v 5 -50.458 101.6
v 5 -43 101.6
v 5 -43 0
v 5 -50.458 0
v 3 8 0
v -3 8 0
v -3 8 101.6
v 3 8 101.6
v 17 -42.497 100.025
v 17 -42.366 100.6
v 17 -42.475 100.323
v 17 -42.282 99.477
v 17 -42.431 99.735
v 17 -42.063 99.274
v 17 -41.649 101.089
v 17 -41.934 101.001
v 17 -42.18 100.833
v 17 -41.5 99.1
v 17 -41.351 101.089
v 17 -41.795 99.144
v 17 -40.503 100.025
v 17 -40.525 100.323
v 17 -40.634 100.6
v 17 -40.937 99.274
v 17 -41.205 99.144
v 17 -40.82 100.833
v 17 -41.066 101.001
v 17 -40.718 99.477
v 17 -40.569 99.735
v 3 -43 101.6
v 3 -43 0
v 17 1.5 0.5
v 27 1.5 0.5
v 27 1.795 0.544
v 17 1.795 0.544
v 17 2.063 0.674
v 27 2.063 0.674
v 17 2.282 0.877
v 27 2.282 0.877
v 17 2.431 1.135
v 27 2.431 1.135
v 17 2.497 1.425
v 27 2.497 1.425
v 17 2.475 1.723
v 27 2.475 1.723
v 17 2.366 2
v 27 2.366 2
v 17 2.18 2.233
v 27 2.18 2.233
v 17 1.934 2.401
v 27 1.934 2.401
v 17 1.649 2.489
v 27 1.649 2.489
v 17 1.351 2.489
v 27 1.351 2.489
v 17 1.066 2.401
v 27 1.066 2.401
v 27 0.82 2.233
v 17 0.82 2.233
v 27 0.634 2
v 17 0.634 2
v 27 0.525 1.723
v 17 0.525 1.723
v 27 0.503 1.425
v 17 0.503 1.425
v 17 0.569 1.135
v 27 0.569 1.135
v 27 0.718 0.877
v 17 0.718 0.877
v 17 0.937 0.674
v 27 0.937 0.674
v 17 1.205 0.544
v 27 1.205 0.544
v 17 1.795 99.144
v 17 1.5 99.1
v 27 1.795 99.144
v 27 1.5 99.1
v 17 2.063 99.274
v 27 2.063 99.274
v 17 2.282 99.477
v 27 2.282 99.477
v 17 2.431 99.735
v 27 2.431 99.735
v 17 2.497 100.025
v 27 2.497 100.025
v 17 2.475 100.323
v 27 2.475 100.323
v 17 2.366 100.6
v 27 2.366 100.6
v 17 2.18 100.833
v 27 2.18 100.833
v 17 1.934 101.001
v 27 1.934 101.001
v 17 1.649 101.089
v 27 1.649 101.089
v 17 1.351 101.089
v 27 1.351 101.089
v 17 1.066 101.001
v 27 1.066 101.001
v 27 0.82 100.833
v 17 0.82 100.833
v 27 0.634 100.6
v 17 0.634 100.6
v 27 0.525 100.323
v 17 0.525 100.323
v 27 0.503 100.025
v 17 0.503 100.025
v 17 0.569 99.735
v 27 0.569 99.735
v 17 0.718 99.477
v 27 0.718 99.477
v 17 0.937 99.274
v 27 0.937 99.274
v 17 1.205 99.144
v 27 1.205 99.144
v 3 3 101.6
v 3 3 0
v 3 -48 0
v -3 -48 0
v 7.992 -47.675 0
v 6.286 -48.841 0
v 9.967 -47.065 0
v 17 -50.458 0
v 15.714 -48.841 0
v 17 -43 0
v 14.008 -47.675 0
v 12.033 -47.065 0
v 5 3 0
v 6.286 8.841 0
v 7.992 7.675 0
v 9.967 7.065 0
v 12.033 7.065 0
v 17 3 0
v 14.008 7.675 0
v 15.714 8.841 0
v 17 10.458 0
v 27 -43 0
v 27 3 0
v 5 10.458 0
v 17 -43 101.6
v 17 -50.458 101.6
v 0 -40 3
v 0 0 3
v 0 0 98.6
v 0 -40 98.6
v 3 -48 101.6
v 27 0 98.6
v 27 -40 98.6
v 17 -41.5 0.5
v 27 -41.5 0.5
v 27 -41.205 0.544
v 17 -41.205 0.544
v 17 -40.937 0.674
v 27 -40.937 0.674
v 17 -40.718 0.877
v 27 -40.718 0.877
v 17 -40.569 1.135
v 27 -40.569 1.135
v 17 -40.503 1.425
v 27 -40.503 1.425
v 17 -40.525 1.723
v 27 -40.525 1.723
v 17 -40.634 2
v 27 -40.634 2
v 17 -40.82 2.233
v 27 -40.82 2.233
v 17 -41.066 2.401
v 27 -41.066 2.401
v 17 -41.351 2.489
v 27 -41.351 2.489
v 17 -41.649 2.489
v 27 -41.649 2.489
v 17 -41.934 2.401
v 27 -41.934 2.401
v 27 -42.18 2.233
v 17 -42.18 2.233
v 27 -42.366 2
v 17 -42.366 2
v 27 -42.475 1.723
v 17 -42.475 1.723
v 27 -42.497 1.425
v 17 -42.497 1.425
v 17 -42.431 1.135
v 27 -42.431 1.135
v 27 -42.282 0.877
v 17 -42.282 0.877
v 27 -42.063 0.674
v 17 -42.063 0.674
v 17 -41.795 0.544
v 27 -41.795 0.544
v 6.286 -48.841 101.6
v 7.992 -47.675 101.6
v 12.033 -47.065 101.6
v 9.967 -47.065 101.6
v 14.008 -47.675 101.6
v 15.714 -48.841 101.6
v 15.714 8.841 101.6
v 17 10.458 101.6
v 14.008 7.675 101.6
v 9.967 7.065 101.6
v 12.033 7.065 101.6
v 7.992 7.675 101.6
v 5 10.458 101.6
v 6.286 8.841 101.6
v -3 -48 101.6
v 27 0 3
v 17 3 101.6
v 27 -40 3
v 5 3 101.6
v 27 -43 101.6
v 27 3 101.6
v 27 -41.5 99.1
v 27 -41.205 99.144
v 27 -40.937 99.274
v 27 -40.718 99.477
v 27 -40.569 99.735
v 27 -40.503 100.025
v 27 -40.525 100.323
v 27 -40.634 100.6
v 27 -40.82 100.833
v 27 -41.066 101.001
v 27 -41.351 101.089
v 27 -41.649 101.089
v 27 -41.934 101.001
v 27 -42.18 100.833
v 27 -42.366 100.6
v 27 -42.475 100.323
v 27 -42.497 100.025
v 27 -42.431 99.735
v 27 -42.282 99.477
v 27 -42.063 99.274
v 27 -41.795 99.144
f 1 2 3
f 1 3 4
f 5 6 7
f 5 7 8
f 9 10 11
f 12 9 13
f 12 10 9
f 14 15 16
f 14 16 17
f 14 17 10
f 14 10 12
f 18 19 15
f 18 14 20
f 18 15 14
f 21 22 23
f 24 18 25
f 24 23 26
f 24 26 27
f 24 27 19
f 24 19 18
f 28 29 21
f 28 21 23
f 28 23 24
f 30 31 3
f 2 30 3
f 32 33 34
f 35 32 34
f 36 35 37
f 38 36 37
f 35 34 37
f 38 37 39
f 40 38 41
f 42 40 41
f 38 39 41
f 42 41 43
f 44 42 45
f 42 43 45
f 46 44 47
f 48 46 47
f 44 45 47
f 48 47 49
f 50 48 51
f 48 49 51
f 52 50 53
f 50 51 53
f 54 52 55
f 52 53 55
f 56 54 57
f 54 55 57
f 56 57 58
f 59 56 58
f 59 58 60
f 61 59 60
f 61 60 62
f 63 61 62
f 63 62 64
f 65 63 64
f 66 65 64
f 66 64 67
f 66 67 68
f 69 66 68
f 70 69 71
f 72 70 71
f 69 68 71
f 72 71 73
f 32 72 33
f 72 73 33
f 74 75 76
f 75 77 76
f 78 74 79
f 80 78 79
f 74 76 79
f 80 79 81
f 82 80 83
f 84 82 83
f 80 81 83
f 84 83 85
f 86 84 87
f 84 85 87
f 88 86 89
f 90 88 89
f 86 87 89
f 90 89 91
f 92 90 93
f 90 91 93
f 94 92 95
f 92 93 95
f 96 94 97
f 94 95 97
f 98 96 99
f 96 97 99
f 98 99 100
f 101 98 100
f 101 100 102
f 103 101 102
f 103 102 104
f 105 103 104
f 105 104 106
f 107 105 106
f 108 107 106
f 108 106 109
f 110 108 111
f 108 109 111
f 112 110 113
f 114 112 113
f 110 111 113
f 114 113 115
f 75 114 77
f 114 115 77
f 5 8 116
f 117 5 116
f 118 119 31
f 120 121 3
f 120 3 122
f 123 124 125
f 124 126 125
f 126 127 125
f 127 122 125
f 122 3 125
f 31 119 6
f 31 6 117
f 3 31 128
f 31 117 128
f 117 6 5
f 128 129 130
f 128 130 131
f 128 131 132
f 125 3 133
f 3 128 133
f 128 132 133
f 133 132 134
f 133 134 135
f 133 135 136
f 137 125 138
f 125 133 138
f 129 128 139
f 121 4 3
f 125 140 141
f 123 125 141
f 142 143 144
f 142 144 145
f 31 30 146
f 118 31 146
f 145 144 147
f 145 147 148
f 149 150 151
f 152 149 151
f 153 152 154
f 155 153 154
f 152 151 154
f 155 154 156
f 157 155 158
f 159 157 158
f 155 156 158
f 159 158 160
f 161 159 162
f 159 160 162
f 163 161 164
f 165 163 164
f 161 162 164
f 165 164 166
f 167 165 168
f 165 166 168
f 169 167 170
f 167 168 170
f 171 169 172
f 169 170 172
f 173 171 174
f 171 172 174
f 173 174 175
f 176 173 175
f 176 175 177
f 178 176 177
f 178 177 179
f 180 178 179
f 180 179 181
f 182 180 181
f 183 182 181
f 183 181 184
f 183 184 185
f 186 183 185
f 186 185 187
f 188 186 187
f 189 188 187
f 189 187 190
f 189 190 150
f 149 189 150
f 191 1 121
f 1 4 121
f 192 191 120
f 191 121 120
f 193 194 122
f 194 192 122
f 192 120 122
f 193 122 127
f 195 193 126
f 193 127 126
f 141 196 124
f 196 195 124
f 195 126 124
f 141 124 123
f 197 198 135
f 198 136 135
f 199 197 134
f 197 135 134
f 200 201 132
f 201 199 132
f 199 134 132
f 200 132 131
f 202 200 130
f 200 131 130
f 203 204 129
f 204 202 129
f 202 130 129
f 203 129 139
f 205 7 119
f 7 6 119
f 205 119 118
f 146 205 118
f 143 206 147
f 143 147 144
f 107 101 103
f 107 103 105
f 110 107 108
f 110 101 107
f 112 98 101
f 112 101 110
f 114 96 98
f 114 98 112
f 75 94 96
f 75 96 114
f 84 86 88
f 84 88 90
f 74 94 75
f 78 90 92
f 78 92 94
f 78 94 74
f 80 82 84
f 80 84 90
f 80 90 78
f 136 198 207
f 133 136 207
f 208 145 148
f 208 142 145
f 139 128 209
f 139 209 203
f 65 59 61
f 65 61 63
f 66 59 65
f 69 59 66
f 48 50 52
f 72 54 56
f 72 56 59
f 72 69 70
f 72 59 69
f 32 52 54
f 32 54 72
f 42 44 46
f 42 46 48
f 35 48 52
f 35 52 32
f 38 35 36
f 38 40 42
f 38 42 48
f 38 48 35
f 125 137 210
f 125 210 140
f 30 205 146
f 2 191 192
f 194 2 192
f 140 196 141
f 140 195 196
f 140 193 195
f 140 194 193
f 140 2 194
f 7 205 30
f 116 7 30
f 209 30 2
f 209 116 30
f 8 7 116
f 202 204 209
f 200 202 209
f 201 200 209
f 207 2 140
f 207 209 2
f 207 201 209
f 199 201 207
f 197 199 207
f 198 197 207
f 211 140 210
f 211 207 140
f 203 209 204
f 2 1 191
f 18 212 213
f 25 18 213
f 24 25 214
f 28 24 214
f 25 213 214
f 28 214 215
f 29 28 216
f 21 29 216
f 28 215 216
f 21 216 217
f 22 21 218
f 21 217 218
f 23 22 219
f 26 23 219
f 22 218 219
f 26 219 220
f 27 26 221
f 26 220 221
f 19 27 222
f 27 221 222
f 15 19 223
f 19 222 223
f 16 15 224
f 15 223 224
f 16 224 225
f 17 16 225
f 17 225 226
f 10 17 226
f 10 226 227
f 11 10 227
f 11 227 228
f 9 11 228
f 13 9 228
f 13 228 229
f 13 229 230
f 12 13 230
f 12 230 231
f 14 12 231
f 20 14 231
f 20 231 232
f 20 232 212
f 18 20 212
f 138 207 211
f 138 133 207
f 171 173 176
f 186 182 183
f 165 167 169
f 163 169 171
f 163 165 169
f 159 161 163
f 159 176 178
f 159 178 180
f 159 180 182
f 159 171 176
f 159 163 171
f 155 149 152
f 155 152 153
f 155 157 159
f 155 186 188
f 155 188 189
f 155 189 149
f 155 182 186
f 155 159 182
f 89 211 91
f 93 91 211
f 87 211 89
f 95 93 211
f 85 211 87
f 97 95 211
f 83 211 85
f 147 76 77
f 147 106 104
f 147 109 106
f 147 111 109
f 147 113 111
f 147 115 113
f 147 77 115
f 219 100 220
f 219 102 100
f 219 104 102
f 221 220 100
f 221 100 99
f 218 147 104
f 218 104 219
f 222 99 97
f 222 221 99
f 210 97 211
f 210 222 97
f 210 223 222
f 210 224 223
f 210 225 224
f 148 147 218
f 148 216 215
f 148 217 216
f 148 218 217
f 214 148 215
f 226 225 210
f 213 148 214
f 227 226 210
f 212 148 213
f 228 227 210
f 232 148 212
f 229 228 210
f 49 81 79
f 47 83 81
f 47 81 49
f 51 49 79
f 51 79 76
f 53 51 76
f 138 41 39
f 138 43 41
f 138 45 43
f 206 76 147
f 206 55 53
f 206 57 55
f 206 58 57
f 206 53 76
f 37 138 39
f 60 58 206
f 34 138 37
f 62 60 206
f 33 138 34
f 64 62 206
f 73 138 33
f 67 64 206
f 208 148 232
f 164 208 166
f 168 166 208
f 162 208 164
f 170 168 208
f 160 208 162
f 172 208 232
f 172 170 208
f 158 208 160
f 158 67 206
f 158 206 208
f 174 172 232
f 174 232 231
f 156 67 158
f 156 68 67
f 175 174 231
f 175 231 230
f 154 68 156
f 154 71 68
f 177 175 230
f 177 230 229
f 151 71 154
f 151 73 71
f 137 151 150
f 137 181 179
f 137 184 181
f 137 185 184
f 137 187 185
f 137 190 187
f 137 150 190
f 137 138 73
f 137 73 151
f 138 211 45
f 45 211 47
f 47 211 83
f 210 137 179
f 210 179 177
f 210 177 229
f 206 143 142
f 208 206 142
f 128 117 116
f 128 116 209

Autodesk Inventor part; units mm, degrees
ref_plane "YZ Plane" through (0, 0, 0) normal (1, 0, 0) x (0, 1, 0)
ref_plane "XZ Plane" through (0, 0, 0) normal (0, 1, 0) x (-1, 0, 0)
ref_plane "XY Plane" through (0, 0, 0) normal (0, 0, 1) x (1, 0, 0)
sketch "Sketch2" plane through (0, 0, 0) normal (0, 0, 1) x (1, 0, 0)
  line L0 (-3, 8) -> (-3, -48)
  line L1 (-3, 8) -> (3, 8)
  line L2 (3, 8) -> (3, 3)
  line L3 (3, 3) -> (5, 3)
  line L4 (5, 3) -> (5, 10.4583)
  arc A0 (5, 10.4583) -> (17, 10.4583) centre (11, 13.909) ccw
  line L5 (17, 10.4583) -> (17, 3)
  line L6 (17, 3) -> (27, 3)
  line L7 (-3, -48) -> (3, -48)
  line L8 (3, -43) -> (3, -48)
  line L9 (27, -43) -> (17, -43)
  arc A1 (17, -50.4583) -> (5, -50.4583) centre (11, -53.909) ccw
  line L10 (3, -43) -> (5, -43)
  line L11 (5, -43) -> (5, -50.4583)
  line L12 (17, -43) -> (17, -50.4583)
  line L13 (27, 3) -> (27, 0)
  line L14 (27, 0) -> (0, 0)
  line L15 (0, 0) -> (0, -40)
  line L16 (0, -40) -> (27, -40)
  line L17 (27, -40) -> (27, -43)
  dimension "d13" = 12
  dimension "d14" = 2
  dimension "d20" = 5
  dimension "d22" = 13.843
  dimension "d29" = 3
  dimension "d30" = 3
  dimension "d31" = 3
  dimension "d33" = 40
  dimension "d34" = 27
  dimension "d36" = 16
  dimension "d38" = 67.818
  dimension "d53" = 6.9215
  dimension "d54" = 10
extrude "Extrusion1" add sketch "Sketch2" along normal blind 101.6
sketch "Sketch3" plane through (0, -40, 0) normal (1, 0, 0) x (0, 0, -1)
  line L0 (0, 0) -> (0, 40) projected
  line L1 (0, 40) -> (-101.6, 40) projected
  line L2 (-101.6, 0) -> (-101.6, 40) projected
  line L3 (0, 0) -> (-101.6, 0) projected
  line L4 (-101.6, 40) -> (-98.6, 40)
  line L5 (-98.6, 40) -> (-98.6, 0)
  line L6 (-98.6, 0) -> (-101.6, 0)
  line L7 (-101.6, 0) -> (-101.6, 40)
  line L8 (0, 40) -> (-3, 40)
  line L9 (-3, 40) -> (-3, 0)
  line L10 (-3, 0) -> (0, 0)
  line L11 (0, 0) -> (0, 40)
  dimension "d39" = 3
  dimension "d40" = 3
extrude "Extrusion2" add sketch "Sketch3" along normal blind 27 contours L3 L9 L1 L0 | L3 L2 L1 L5
sketch "Sketch4" plane through (27, -43, 0) normal (1, 0, 0) x (0, 0, -1)
  circle A0 centre (-100.1, 44.5) radius 1
  line L0 (-3, 3) -> (-98.6, 3) projected
  line L1 (-98.6, 3) -> (-98.6, 43) projected
  line L2 (-3, 43) -> (-98.6, 43) projected
  line L3 (-3, 43) -> (-3, 3) projected
  line L4 (0, 0) -> (0, 46) projected
  line L5 (0, 46) -> (-101.6, 46) projected
  line L6 (-101.6, 0) -> (-101.6, 46) projected
  line L7 (0, 0) -> (-101.6, 0) projected
  circle A1 centre (-1.5, 44.5) radius 1
  circle A2 centre (-1.5, 1.5) radius 1
  circle A3 centre (-100.1, 1.5) radius 1
  point P0 (0, 43)
  dimension "d43" = 2
  dimension "d44" = 1.5
  dimension "d45" = 1.5
  dimension "d47" = 1.5
  dimension "d48" = 1.5
extrude "Extrusion3" cut sketch "Sketch4" against normal blind 10 contours A0 | A1 | A2 | A3
equation "\"TUBE_OUTER\" = 13.843"
equation "\"INTER_TUBE\" = 53.975"
equation "\"CUPPING\" = 5.08"
equation "\"d19\" = TUBE_OUTER"
equation "\"W_THICK\" = 3"
equation "\"SCREW_D\" = 2"
properties part number "Casing"
